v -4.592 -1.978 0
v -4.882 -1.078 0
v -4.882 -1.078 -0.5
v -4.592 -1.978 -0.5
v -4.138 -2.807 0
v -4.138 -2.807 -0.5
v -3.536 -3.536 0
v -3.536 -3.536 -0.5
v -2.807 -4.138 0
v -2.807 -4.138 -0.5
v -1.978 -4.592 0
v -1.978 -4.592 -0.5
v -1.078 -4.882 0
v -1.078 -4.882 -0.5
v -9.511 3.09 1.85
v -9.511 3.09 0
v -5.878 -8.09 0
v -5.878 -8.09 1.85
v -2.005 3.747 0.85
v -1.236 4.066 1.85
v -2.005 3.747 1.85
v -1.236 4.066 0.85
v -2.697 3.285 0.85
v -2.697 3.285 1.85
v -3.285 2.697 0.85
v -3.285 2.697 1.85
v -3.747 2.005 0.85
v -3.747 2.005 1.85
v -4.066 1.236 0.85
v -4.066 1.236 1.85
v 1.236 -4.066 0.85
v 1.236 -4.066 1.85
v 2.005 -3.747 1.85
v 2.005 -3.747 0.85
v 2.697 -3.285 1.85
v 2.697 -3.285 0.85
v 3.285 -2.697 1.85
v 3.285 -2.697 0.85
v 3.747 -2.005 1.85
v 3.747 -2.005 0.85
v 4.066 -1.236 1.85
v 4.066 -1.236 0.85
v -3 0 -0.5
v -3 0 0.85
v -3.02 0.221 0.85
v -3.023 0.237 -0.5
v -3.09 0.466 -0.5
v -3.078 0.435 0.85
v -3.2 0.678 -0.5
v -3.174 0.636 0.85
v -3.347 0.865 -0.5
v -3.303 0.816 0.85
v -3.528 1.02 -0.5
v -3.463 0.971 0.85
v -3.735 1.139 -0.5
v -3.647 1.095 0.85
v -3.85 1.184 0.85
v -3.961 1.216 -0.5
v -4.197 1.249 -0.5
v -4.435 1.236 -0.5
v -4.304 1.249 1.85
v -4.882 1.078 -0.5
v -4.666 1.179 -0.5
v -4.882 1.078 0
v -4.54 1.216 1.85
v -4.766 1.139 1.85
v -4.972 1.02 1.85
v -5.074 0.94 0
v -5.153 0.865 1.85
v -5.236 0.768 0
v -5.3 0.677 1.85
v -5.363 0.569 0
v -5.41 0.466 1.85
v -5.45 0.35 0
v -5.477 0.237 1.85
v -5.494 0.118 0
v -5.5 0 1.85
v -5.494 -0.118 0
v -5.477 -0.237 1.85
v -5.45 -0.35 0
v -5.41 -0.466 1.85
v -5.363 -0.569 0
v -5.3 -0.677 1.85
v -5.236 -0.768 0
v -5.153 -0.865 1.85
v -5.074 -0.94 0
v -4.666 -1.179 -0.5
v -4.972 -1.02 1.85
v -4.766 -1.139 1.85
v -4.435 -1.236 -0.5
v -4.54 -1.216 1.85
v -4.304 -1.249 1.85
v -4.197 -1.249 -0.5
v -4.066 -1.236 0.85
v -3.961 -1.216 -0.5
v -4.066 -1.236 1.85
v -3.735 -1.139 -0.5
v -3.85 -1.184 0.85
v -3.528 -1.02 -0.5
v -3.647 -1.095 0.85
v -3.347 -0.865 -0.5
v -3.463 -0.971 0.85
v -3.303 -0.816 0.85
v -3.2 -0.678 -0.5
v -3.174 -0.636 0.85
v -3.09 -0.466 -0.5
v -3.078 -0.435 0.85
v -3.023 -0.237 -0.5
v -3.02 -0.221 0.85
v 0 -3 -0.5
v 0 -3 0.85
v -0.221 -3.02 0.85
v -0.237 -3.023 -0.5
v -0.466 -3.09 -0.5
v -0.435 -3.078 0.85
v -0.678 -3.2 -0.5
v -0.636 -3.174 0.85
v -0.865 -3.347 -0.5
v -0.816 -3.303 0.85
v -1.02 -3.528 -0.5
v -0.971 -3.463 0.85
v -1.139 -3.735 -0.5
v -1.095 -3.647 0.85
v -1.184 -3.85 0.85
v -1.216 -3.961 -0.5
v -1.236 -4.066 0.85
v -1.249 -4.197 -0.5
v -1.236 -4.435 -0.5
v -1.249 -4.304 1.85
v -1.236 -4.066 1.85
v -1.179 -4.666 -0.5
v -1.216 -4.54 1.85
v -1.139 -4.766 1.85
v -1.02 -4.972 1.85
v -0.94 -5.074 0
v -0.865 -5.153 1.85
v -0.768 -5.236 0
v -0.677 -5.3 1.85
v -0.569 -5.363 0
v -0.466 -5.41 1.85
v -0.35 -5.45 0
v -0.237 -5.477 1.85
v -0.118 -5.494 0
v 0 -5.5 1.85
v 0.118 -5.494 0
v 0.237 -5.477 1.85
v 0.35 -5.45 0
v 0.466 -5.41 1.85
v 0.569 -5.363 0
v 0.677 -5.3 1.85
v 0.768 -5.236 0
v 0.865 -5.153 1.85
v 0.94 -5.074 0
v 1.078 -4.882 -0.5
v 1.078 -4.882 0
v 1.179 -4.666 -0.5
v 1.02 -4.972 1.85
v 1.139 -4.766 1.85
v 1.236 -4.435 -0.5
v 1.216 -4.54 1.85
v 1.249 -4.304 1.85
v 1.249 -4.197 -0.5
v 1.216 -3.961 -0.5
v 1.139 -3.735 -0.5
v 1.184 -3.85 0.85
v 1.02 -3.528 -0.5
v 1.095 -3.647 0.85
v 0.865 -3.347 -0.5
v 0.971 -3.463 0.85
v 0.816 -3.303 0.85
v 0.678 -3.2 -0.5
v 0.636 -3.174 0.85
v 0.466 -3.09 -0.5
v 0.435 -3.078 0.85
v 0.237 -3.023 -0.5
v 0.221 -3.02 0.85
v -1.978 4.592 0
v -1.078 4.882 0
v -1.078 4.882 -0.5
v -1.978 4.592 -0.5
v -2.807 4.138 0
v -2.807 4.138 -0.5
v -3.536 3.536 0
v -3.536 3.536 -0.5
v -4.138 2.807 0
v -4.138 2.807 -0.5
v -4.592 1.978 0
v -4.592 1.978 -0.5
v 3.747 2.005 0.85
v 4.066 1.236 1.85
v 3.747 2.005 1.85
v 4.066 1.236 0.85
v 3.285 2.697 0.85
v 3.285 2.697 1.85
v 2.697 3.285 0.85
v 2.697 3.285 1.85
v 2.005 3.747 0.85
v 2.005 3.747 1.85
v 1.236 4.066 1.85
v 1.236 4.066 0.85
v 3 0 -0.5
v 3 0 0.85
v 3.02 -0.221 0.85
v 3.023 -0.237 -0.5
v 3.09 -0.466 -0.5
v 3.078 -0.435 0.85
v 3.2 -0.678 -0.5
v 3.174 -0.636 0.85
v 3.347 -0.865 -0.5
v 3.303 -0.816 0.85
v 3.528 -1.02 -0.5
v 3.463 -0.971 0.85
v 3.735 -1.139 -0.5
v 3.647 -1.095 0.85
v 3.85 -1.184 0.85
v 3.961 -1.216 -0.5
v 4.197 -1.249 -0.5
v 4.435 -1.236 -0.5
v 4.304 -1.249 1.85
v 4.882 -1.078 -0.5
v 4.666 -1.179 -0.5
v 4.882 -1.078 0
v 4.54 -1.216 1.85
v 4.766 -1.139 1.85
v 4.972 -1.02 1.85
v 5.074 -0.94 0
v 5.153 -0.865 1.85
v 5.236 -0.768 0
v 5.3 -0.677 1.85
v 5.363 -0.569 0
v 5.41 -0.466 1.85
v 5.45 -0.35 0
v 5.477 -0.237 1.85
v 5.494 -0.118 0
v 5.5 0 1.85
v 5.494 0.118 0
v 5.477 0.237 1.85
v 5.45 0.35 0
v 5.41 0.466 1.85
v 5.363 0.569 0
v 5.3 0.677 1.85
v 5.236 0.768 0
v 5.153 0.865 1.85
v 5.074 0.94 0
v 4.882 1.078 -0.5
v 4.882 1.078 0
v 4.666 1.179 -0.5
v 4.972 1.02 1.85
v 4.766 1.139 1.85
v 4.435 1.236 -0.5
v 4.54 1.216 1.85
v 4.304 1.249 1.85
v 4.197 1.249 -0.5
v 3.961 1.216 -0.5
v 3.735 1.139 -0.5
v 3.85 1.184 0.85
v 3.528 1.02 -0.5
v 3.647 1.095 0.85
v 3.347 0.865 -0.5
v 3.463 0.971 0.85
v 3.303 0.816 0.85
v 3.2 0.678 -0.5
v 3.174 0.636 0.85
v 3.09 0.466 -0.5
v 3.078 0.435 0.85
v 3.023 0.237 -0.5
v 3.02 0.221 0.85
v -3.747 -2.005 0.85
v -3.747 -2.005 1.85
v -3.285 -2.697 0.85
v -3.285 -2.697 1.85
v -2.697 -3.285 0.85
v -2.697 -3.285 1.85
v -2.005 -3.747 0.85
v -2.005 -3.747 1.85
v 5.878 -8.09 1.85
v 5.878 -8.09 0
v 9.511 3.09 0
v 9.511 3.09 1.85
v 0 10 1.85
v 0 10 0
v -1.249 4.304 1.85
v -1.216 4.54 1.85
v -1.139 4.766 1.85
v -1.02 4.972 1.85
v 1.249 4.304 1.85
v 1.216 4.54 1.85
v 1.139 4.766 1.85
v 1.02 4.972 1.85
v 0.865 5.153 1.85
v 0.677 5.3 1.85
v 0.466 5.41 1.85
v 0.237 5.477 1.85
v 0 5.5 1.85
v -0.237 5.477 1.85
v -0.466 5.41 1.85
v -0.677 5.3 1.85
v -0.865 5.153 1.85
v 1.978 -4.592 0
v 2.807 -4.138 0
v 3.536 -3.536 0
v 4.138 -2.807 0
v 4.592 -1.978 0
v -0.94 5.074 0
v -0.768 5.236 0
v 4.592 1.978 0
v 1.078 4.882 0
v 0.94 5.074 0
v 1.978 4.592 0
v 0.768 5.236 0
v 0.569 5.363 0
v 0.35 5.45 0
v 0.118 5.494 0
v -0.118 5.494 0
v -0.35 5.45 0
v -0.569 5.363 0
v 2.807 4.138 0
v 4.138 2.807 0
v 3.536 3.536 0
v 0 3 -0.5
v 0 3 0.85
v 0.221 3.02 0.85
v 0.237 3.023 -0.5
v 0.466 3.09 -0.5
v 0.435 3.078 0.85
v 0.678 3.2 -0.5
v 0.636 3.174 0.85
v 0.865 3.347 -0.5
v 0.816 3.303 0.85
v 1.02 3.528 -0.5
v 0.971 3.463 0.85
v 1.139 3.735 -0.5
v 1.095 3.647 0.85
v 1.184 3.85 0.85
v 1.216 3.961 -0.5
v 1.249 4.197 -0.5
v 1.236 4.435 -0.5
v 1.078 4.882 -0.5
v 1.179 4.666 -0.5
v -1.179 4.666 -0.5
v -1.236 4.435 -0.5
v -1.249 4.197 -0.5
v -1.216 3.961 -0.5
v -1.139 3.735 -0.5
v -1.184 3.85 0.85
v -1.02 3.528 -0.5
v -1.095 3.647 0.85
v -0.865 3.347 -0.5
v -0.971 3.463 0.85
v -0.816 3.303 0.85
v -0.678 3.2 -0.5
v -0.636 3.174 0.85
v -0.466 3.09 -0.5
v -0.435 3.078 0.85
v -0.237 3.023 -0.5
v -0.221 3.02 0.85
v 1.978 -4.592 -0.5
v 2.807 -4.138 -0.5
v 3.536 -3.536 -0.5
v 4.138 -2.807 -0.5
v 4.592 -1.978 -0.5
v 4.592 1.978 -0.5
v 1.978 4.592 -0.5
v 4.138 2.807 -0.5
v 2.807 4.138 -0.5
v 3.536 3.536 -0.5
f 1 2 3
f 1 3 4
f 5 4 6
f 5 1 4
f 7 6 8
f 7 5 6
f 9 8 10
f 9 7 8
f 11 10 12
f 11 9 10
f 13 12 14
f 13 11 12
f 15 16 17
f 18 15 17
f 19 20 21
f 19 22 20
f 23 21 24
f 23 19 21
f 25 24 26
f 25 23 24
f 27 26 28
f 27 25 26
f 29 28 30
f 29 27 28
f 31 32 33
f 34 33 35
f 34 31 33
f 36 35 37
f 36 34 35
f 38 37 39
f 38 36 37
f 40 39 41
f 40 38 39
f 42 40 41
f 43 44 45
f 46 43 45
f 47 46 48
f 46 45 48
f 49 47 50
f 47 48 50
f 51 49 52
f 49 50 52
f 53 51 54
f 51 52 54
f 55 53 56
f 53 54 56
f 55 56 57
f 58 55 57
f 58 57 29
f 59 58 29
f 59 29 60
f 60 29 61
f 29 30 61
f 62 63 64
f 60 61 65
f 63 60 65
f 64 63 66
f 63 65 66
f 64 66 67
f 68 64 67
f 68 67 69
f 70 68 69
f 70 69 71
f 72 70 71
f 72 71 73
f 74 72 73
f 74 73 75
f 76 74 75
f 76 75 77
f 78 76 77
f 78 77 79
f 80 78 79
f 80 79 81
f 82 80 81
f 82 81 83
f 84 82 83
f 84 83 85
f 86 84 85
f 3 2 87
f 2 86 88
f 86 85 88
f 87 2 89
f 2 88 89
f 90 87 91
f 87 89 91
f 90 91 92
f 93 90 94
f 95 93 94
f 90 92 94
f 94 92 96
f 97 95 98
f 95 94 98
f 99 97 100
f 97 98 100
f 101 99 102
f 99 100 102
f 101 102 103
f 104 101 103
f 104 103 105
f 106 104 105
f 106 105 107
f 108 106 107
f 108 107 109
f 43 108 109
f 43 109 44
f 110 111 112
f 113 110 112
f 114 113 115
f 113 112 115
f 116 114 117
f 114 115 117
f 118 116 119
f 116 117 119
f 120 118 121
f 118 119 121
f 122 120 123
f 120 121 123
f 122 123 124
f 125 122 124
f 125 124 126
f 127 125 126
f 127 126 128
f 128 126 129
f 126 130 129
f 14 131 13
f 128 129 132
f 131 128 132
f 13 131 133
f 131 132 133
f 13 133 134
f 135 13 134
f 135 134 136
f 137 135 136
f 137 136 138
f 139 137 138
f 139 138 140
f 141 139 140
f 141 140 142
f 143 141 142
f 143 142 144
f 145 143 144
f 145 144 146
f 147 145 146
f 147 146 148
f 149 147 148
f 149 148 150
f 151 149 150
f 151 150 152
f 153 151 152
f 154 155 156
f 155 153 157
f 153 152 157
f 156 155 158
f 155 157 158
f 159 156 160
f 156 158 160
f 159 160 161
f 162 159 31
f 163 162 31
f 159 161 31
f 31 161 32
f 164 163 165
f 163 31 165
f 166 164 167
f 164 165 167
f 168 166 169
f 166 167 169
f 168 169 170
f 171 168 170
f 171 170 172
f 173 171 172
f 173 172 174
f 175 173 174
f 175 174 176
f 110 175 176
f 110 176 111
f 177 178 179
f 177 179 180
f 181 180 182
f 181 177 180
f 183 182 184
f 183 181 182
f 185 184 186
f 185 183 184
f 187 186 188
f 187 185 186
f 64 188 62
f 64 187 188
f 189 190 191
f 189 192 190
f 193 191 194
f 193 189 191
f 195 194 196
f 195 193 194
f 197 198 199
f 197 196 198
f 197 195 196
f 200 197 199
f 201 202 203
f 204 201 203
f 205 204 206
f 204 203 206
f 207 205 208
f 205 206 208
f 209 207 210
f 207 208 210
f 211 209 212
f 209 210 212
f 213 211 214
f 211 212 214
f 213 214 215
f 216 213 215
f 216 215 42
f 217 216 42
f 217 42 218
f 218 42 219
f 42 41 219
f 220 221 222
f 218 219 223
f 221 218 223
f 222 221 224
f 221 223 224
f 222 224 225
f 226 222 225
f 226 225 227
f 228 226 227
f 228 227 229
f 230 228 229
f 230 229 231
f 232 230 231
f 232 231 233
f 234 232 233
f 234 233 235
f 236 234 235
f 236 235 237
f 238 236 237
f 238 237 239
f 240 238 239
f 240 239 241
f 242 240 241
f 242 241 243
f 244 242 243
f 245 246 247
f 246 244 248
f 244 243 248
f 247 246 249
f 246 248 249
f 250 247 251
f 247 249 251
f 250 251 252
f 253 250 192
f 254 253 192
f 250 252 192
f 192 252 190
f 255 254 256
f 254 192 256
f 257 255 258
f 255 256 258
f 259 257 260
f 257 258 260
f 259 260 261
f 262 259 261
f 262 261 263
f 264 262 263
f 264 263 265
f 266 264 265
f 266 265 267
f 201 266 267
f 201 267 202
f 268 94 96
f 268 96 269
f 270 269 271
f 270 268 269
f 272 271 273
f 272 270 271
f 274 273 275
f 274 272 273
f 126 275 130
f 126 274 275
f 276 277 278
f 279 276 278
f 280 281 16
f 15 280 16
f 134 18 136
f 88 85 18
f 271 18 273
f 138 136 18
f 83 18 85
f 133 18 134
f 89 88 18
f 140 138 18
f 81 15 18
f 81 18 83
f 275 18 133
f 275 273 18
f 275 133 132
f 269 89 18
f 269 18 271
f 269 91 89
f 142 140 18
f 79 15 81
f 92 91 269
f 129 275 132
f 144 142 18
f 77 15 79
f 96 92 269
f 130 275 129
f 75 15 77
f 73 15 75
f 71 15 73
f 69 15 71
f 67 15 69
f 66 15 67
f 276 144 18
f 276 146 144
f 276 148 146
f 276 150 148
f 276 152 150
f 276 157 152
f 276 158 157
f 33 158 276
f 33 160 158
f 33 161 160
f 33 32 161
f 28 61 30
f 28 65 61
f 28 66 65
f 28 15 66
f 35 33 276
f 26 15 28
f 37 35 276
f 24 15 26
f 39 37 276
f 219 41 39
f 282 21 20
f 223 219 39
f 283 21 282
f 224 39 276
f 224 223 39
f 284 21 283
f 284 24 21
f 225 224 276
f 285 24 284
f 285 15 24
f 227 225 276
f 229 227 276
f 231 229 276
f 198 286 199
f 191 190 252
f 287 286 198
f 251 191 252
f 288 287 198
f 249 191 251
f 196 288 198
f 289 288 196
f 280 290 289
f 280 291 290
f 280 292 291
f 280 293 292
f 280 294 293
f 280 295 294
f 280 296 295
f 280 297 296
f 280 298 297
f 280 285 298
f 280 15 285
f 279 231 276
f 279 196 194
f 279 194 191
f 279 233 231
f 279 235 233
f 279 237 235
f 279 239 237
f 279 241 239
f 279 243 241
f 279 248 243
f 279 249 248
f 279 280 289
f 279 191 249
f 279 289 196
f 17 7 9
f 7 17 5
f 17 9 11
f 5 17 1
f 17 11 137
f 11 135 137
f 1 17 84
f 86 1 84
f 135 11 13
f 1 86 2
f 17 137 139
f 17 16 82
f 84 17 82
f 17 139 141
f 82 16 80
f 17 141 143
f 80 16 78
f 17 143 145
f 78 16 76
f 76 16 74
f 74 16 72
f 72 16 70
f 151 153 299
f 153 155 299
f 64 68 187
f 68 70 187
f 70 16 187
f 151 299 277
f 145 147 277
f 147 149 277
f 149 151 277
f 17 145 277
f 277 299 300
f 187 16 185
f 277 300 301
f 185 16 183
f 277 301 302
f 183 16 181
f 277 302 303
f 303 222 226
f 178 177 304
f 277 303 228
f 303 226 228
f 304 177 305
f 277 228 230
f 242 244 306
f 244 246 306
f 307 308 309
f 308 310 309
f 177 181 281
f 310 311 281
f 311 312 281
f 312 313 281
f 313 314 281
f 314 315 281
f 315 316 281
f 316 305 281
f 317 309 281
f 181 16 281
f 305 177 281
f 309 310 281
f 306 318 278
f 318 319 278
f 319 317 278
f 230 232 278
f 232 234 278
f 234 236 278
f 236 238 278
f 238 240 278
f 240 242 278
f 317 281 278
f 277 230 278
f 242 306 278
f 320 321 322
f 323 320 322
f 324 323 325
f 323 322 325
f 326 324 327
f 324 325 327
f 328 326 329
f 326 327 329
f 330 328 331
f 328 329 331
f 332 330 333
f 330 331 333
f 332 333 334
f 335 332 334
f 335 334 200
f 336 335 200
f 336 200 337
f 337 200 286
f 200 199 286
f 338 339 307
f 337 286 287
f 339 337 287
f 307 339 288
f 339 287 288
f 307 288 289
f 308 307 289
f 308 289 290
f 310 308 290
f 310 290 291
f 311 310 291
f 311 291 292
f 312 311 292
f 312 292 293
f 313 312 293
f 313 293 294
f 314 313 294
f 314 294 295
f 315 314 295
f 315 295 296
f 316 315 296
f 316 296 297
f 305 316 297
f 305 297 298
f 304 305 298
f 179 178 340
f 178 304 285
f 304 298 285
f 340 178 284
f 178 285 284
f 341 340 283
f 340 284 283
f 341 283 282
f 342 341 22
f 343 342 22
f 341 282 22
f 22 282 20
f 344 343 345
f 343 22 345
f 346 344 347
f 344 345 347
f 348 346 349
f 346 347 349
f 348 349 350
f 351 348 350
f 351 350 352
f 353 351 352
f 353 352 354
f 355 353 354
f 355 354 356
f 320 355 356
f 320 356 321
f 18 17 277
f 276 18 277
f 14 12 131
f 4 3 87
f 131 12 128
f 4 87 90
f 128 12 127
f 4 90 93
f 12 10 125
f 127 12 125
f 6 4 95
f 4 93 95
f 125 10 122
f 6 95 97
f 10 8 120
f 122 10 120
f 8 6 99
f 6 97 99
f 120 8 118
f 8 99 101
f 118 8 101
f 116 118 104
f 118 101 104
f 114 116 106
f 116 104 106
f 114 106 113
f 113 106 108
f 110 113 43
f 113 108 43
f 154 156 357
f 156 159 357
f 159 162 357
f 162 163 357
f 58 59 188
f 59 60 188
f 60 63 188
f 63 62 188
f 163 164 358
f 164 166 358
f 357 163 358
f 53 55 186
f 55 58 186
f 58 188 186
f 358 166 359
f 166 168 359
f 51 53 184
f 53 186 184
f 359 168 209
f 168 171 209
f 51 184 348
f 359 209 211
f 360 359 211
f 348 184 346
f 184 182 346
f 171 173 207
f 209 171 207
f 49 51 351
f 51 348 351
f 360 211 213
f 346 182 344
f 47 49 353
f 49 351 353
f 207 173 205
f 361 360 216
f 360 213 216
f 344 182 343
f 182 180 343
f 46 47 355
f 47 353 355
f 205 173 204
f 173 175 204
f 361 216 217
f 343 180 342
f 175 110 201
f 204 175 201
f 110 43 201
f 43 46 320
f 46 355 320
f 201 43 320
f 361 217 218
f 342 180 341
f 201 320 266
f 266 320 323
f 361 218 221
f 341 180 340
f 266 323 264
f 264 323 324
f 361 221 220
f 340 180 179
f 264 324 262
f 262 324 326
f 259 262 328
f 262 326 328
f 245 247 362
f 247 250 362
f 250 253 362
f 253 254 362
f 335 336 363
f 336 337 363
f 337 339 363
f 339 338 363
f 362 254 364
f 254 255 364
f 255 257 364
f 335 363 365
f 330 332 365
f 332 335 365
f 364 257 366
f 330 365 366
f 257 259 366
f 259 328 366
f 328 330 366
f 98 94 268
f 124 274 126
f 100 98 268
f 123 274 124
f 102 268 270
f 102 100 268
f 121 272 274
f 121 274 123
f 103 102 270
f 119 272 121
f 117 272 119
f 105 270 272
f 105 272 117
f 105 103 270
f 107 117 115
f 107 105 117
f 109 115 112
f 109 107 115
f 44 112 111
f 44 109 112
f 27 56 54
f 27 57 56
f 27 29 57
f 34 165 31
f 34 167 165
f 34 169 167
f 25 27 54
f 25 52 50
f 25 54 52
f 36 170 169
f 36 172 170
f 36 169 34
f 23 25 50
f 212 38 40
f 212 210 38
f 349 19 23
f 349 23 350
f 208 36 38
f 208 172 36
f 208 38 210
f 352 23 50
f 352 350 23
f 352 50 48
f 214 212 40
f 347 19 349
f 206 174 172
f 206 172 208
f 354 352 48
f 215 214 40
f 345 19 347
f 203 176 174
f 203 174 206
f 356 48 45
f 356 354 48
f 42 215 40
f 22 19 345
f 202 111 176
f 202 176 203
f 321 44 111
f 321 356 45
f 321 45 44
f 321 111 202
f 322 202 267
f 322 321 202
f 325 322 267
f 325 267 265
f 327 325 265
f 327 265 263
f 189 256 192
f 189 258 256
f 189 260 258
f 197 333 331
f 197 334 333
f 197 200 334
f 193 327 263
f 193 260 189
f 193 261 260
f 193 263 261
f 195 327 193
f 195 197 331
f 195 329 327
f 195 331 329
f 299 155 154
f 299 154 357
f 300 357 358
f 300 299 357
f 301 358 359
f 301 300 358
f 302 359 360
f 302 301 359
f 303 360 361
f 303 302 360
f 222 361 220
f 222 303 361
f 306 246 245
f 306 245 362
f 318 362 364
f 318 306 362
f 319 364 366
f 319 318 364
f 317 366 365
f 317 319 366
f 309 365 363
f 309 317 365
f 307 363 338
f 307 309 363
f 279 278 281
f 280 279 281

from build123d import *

# Parameters (mm, degrees)
SKETCH_R           = 10
SKETCH_W           = 14.142136
SKETCH_H           = 14.142136
PAD_DEPTH          = 1.85
SKETCH001_W        = 40
SKETCH001_H        = 320
POCKET_DEPTH       = 100
POCKET_DEPTH_BACK  = 100
POCKET002_START    = 0.85
SKETCH003_R        = 4.25
POCKET002_DEPTH    = 99.15
SKETCH004_R        = 5
PAD001_DEPTH       = 0.5
SKETCH002_R        = 1.25
POCKET001_DEPTH    = 50
POLARPATTERN_COUNT = 4


with BuildPart() as part:
    # Sketch → Pad (new body)
    with BuildSketch(Plane.XY):
        with Locations((0, 40)):
            Circle(SKETCH_R)
        Polygon((0, 90), (-8.660254, 75), (8.660254, 75), align=None)
        with Locations((0, 120)):
            Rectangle(SKETCH_W, SKETCH_H)
        Polygon((0, 10), (-9.510565, 3.09017), (-5.877853, -8.09017), (5.877853, -8.09017), (9.510565, 3.09017), align=None)
        Polygon((-8.660254, 205), (-8.660254, 195), (0, 190), (8.660254, 195), (8.660254, 205), (0, 210), align=None)
    extrude(amount=PAD_DEPTH)

    # Sketch001 → Pocket (cut, two sides)
    with BuildSketch(Plane.XY) as pocket_sk:
        with Locations((0, 180.01)):
            Rectangle(SKETCH001_W, SKETCH001_H)
    extrude(amount=POCKET_DEPTH, mode=Mode.SUBTRACT)
    extrude(pocket_sk.sketch, amount=-POCKET_DEPTH_BACK, mode=Mode.SUBTRACT)

    # Sketch003 → Pocket002 (cut)
    with BuildSketch(Plane.XY.offset(POCKET002_START)):
        Circle(SKETCH003_R)
    extrude(amount=POCKET002_DEPTH, mode=Mode.SUBTRACT)

    # Sketch004 → Pad001 (join)
    with BuildSketch(Plane.XY):
        Circle(SKETCH004_R)
    extrude(amount=-PAD001_DEPTH)

    # Sketch002 → Pocket001 (cut, symmetric)
    with BuildSketch(Plane.XY):
        with Locations((-4.25, 0)):
            Circle(SKETCH002_R)
    pocket001 = extrude(amount=POCKET001_DEPTH, both=True, mode=Mode.SUBTRACT)

    # PolarPattern: Pocket001 ×4 about axis
    polarpattern_axis = Axis((0, 0, 0), (0, 0, 1))
    for i in range(1, POLARPATTERN_COUNT):
        add(pocket001.rotate(polarpattern_axis, i * 360 / POLARPATTERN_COUNT), mode=Mode.SUBTRACT)


solid = part.part
